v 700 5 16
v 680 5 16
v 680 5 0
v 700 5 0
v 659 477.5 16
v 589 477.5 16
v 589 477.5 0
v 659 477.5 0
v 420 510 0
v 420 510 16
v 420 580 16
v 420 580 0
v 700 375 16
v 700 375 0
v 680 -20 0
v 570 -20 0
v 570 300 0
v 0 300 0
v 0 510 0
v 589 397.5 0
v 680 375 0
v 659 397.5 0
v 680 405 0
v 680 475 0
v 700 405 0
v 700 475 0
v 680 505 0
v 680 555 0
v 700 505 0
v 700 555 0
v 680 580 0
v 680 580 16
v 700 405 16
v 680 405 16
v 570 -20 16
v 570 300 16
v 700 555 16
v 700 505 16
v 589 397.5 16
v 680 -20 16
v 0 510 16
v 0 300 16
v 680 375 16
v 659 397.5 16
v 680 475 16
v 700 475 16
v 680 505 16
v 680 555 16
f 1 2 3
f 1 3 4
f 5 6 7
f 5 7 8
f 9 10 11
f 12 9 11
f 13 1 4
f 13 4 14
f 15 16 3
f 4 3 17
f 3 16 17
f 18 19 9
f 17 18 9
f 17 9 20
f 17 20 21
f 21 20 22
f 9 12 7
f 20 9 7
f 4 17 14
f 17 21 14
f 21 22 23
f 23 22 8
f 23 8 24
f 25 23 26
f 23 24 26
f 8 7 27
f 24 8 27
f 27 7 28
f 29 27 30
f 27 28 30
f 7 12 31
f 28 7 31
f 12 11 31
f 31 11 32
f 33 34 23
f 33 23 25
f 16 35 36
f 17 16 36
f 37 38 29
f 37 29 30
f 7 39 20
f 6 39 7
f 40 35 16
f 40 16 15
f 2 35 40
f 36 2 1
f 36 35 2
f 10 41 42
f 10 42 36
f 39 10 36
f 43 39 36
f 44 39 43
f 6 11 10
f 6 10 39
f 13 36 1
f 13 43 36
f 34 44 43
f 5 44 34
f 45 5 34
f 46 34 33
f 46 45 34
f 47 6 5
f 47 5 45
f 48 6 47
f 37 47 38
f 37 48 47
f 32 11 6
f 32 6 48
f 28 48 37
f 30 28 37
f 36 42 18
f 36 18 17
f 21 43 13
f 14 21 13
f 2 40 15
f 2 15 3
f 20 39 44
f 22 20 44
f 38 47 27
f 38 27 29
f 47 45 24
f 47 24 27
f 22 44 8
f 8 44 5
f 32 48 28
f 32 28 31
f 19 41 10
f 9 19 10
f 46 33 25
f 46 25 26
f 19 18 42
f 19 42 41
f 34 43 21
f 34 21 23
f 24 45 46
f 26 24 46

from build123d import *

# Parameters (mm, degrees)
SKETCH1_W           = 680
SKETCH1_H           = 560
BOSS_EXTRUDE1_DEPTH = 16
SKETCH2_W           = 550
SKETCH2_H           = 20
BOSS_EXTRUDE2_DEPTH = 16
SKETCH3_W           = 70
SKETCH3_H           = 80
CUT_EXTRUDE1_DEPTH  = 17
CUT_EXTRUDE2_REACH  = 18
SKETCH4_W           = 570
SKETCH4_H           = 320
SKETCH4_H_2         = 70
SKETCH5_W           = 20
SKETCH5_H           = 50
SKETCH5_H_2         = 70
SKETCH5_H_3         = 370
BOSS_EXTRUDE3_DEPTH = 16
SKETCH6_W           = 150
SKETCH6_H           = 70
BOSS_EXTRUDE4_DEPTH = 16


with BuildPart() as part:
    # Sketch1 → Boss-Extrude1 (new body)
    with BuildSketch(Plane.XY):
        with Locations((340, 280)):
            Rectangle(SKETCH1_W, SKETCH1_H)
    extrude(amount=BOSS_EXTRUDE1_DEPTH)

    # Sketch2 → Boss-Extrude2 (add)
    with BuildSketch(Plane.XY.offset(16)):
        with Locations((405, -10)):
            Rectangle(SKETCH2_W, SKETCH2_H)
        with Locations((405, 570)):
            Rectangle(SKETCH2_W, SKETCH2_H)
    extrude(amount=-BOSS_EXTRUDE2_DEPTH)

    # Sketch3 → Cut-Extrude1 (cut, through all)
    with BuildSketch(Plane.XY.offset(16)):
        with Locations((624, 437.5)):
            Rectangle(SKETCH3_W, SKETCH3_H)
    extrude(amount=-CUT_EXTRUDE1_DEPTH, mode=Mode.SUBTRACT)

    # Sketch4 → Cut-Extrude2 (cut, up to next)
    with BuildSketch(Plane.XY.offset(16), mode=Mode.PRIVATE) as cut_extrude2_sk1:
        with Locations((285, 140)):
            Rectangle(SKETCH4_W, SKETCH4_H)
    cut_extrude2_tool1 = extrude(cut_extrude2_sk1.sketch, amount=-CUT_EXTRUDE2_REACH, mode=Mode.PRIVATE) & part.part
    add(cut_extrude2_tool1.solids().sort_by_distance((285, 140, 16))[0], mode=Mode.SUBTRACT)
    # Sketch4 → Cut-Extrude2 (cut, up to next)
    with BuildSketch(Plane.XY.offset(16), mode=Mode.PRIVATE) as cut_extrude2_sk2:
        with Locations((285, 545)):
            Rectangle(SKETCH4_W, SKETCH4_H_2)
    cut_extrude2_tool2 = extrude(cut_extrude2_sk2.sketch, amount=-CUT_EXTRUDE2_REACH, mode=Mode.PRIVATE) & part.part
    add(cut_extrude2_tool2.solids().sort_by_distance((285, 545, 16))[0], mode=Mode.SUBTRACT)

    # Sketch5 → Boss-Extrude3 (add)
    with BuildSketch(Plane.XY.offset(16)):
        with Locations((690, 530)):
            Rectangle(SKETCH5_W, SKETCH5_H)
        with Locations((690, 440)):
            Rectangle(SKETCH5_W, SKETCH5_H_2)
        with Locations((690, 190)):
            Rectangle(SKETCH5_W, SKETCH5_H_3)
    extrude(amount=-BOSS_EXTRUDE3_DEPTH)

    # Sketch6 → Boss-Extrude4 (add)
    with BuildSketch(Plane.XY.offset(16)):
        with Locations((495, 545)):
            Rectangle(SKETCH6_W, SKETCH6_H)
    extrude(amount=-BOSS_EXTRUDE4_DEPTH)


solid = part.part
